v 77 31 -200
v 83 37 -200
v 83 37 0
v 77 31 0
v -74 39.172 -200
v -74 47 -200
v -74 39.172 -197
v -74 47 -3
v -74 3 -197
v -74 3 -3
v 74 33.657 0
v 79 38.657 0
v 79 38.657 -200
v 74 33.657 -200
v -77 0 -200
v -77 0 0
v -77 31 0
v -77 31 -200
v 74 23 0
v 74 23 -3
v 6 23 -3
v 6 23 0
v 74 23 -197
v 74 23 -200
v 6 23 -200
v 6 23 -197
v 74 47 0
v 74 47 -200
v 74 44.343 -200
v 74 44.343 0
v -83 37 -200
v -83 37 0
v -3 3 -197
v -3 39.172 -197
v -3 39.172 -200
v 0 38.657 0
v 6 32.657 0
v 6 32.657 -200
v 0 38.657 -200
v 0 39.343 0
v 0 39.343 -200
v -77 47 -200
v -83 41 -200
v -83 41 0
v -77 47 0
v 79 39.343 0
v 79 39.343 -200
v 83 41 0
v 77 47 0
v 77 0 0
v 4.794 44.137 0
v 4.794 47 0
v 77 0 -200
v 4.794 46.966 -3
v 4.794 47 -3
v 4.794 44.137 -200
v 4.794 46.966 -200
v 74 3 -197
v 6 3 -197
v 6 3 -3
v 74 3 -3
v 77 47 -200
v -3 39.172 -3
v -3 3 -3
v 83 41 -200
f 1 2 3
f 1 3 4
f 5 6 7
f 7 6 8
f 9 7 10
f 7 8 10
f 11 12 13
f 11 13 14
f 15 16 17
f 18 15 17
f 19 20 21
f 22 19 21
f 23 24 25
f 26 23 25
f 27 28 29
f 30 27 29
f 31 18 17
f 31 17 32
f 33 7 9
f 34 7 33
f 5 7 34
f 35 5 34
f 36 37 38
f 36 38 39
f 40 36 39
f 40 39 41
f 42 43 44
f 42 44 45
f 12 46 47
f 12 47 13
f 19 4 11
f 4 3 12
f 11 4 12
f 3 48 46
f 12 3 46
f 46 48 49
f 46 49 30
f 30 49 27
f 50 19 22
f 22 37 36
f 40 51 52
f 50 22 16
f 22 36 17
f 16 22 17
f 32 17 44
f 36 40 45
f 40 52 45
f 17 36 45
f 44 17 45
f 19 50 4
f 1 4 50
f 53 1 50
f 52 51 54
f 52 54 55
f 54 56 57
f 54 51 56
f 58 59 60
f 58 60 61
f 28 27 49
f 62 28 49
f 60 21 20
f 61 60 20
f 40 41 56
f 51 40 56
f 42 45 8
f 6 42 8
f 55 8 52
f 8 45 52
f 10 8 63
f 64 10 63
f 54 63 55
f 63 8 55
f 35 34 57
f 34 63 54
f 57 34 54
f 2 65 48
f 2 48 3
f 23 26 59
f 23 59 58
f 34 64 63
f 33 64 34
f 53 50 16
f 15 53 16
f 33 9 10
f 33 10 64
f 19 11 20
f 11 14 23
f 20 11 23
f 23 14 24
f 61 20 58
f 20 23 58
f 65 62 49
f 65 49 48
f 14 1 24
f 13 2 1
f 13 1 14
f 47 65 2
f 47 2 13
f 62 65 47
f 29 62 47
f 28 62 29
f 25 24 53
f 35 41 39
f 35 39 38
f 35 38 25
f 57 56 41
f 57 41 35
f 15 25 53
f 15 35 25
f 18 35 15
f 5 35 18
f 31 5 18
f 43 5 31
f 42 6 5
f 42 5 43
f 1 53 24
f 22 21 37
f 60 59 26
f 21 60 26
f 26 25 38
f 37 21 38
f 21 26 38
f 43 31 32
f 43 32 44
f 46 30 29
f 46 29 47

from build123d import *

# Parameters (mm, degrees)
EXTRUDE_1_DEPTH     = 200
SKETCH_2_W          = 148
SKETCH_2_H          = 194
CUT_EXTRUDE_1_DEPTH = 44
SKETCH_3_W          = 9
SKETCH_3_H          = 194
EXTRUDE_1_2_DEPTH   = 44
CUT_EXTRUDE_2_DEPTH = 222.580685079
CUT_EXTRUDE_3_DEPTH = 219.876677606


with BuildPart() as part:
    # 草图1 → Extrude 1 (new body)
    with BuildSketch(Plane.XY):
        Polygon((77, 0), (-77, 0), (-77, 31), (-83, 37), (-83, 41), (-77, 47), (77, 47), (83, 41), (83, 37), (77, 31), align=None)
    extrude(amount=-EXTRUDE_1_DEPTH)

    # 草图2 → 切除-拉伸1 (cut)
    with BuildSketch(Plane(origin=(0, 47, 0), x_dir=(1, 0, 0), z_dir=(0, 1, 0))):
        with Locations((0, 100)):
            Rectangle(SKETCH_2_W, SKETCH_2_H)
    extrude(amount=-CUT_EXTRUDE_1_DEPTH, mode=Mode.SUBTRACT)

    # 草图3 → Extrude 1 2 (add)
    with BuildSketch(Plane(origin=(0, 3, 0), x_dir=(1, 0, 0), z_dir=(0, 1, 0))):
        with Locations((1.5, 100)):
            Rectangle(SKETCH_3_W, SKETCH_3_H)
    extrude(amount=EXTRUDE_1_2_DEPTH)

    # 草图5 → 切除-拉伸2 (cut, through all)
    with BuildSketch(Plane(origin=(0, 0, -200), x_dir=(-1, 0, 0), z_dir=(0, 0, -1))):
        Polygon((-74, 47), (-74, 44.343145751), (-79, 39.343145751), (-79, 38.656854249), (-74, 33.656854249), (-74, 23), (-6, 23), (-6, 32.656854249), (0, 38.656854249), (0, 39.343145751), (-4.7940469, 44.137192651), (-4.7940469, 47), align=None)
    extrude(amount=-CUT_EXTRUDE_2_DEPTH, mode=Mode.SUBTRACT)

    # 草图6 → 切除-拉伸3 (cut, through all)
    with BuildSketch(Plane(origin=(0, 0, -3), x_dir=(-1, 0, 0), z_dir=(0, 0, -1))):
        Polygon((-4.828427125, 47), (3, 47), (74, 47), (74, 39.171572875), (3, 39.171572875), align=None)
    extrude(amount=CUT_EXTRUDE_3_DEPTH, mode=Mode.SUBTRACT)


solid = part.part
